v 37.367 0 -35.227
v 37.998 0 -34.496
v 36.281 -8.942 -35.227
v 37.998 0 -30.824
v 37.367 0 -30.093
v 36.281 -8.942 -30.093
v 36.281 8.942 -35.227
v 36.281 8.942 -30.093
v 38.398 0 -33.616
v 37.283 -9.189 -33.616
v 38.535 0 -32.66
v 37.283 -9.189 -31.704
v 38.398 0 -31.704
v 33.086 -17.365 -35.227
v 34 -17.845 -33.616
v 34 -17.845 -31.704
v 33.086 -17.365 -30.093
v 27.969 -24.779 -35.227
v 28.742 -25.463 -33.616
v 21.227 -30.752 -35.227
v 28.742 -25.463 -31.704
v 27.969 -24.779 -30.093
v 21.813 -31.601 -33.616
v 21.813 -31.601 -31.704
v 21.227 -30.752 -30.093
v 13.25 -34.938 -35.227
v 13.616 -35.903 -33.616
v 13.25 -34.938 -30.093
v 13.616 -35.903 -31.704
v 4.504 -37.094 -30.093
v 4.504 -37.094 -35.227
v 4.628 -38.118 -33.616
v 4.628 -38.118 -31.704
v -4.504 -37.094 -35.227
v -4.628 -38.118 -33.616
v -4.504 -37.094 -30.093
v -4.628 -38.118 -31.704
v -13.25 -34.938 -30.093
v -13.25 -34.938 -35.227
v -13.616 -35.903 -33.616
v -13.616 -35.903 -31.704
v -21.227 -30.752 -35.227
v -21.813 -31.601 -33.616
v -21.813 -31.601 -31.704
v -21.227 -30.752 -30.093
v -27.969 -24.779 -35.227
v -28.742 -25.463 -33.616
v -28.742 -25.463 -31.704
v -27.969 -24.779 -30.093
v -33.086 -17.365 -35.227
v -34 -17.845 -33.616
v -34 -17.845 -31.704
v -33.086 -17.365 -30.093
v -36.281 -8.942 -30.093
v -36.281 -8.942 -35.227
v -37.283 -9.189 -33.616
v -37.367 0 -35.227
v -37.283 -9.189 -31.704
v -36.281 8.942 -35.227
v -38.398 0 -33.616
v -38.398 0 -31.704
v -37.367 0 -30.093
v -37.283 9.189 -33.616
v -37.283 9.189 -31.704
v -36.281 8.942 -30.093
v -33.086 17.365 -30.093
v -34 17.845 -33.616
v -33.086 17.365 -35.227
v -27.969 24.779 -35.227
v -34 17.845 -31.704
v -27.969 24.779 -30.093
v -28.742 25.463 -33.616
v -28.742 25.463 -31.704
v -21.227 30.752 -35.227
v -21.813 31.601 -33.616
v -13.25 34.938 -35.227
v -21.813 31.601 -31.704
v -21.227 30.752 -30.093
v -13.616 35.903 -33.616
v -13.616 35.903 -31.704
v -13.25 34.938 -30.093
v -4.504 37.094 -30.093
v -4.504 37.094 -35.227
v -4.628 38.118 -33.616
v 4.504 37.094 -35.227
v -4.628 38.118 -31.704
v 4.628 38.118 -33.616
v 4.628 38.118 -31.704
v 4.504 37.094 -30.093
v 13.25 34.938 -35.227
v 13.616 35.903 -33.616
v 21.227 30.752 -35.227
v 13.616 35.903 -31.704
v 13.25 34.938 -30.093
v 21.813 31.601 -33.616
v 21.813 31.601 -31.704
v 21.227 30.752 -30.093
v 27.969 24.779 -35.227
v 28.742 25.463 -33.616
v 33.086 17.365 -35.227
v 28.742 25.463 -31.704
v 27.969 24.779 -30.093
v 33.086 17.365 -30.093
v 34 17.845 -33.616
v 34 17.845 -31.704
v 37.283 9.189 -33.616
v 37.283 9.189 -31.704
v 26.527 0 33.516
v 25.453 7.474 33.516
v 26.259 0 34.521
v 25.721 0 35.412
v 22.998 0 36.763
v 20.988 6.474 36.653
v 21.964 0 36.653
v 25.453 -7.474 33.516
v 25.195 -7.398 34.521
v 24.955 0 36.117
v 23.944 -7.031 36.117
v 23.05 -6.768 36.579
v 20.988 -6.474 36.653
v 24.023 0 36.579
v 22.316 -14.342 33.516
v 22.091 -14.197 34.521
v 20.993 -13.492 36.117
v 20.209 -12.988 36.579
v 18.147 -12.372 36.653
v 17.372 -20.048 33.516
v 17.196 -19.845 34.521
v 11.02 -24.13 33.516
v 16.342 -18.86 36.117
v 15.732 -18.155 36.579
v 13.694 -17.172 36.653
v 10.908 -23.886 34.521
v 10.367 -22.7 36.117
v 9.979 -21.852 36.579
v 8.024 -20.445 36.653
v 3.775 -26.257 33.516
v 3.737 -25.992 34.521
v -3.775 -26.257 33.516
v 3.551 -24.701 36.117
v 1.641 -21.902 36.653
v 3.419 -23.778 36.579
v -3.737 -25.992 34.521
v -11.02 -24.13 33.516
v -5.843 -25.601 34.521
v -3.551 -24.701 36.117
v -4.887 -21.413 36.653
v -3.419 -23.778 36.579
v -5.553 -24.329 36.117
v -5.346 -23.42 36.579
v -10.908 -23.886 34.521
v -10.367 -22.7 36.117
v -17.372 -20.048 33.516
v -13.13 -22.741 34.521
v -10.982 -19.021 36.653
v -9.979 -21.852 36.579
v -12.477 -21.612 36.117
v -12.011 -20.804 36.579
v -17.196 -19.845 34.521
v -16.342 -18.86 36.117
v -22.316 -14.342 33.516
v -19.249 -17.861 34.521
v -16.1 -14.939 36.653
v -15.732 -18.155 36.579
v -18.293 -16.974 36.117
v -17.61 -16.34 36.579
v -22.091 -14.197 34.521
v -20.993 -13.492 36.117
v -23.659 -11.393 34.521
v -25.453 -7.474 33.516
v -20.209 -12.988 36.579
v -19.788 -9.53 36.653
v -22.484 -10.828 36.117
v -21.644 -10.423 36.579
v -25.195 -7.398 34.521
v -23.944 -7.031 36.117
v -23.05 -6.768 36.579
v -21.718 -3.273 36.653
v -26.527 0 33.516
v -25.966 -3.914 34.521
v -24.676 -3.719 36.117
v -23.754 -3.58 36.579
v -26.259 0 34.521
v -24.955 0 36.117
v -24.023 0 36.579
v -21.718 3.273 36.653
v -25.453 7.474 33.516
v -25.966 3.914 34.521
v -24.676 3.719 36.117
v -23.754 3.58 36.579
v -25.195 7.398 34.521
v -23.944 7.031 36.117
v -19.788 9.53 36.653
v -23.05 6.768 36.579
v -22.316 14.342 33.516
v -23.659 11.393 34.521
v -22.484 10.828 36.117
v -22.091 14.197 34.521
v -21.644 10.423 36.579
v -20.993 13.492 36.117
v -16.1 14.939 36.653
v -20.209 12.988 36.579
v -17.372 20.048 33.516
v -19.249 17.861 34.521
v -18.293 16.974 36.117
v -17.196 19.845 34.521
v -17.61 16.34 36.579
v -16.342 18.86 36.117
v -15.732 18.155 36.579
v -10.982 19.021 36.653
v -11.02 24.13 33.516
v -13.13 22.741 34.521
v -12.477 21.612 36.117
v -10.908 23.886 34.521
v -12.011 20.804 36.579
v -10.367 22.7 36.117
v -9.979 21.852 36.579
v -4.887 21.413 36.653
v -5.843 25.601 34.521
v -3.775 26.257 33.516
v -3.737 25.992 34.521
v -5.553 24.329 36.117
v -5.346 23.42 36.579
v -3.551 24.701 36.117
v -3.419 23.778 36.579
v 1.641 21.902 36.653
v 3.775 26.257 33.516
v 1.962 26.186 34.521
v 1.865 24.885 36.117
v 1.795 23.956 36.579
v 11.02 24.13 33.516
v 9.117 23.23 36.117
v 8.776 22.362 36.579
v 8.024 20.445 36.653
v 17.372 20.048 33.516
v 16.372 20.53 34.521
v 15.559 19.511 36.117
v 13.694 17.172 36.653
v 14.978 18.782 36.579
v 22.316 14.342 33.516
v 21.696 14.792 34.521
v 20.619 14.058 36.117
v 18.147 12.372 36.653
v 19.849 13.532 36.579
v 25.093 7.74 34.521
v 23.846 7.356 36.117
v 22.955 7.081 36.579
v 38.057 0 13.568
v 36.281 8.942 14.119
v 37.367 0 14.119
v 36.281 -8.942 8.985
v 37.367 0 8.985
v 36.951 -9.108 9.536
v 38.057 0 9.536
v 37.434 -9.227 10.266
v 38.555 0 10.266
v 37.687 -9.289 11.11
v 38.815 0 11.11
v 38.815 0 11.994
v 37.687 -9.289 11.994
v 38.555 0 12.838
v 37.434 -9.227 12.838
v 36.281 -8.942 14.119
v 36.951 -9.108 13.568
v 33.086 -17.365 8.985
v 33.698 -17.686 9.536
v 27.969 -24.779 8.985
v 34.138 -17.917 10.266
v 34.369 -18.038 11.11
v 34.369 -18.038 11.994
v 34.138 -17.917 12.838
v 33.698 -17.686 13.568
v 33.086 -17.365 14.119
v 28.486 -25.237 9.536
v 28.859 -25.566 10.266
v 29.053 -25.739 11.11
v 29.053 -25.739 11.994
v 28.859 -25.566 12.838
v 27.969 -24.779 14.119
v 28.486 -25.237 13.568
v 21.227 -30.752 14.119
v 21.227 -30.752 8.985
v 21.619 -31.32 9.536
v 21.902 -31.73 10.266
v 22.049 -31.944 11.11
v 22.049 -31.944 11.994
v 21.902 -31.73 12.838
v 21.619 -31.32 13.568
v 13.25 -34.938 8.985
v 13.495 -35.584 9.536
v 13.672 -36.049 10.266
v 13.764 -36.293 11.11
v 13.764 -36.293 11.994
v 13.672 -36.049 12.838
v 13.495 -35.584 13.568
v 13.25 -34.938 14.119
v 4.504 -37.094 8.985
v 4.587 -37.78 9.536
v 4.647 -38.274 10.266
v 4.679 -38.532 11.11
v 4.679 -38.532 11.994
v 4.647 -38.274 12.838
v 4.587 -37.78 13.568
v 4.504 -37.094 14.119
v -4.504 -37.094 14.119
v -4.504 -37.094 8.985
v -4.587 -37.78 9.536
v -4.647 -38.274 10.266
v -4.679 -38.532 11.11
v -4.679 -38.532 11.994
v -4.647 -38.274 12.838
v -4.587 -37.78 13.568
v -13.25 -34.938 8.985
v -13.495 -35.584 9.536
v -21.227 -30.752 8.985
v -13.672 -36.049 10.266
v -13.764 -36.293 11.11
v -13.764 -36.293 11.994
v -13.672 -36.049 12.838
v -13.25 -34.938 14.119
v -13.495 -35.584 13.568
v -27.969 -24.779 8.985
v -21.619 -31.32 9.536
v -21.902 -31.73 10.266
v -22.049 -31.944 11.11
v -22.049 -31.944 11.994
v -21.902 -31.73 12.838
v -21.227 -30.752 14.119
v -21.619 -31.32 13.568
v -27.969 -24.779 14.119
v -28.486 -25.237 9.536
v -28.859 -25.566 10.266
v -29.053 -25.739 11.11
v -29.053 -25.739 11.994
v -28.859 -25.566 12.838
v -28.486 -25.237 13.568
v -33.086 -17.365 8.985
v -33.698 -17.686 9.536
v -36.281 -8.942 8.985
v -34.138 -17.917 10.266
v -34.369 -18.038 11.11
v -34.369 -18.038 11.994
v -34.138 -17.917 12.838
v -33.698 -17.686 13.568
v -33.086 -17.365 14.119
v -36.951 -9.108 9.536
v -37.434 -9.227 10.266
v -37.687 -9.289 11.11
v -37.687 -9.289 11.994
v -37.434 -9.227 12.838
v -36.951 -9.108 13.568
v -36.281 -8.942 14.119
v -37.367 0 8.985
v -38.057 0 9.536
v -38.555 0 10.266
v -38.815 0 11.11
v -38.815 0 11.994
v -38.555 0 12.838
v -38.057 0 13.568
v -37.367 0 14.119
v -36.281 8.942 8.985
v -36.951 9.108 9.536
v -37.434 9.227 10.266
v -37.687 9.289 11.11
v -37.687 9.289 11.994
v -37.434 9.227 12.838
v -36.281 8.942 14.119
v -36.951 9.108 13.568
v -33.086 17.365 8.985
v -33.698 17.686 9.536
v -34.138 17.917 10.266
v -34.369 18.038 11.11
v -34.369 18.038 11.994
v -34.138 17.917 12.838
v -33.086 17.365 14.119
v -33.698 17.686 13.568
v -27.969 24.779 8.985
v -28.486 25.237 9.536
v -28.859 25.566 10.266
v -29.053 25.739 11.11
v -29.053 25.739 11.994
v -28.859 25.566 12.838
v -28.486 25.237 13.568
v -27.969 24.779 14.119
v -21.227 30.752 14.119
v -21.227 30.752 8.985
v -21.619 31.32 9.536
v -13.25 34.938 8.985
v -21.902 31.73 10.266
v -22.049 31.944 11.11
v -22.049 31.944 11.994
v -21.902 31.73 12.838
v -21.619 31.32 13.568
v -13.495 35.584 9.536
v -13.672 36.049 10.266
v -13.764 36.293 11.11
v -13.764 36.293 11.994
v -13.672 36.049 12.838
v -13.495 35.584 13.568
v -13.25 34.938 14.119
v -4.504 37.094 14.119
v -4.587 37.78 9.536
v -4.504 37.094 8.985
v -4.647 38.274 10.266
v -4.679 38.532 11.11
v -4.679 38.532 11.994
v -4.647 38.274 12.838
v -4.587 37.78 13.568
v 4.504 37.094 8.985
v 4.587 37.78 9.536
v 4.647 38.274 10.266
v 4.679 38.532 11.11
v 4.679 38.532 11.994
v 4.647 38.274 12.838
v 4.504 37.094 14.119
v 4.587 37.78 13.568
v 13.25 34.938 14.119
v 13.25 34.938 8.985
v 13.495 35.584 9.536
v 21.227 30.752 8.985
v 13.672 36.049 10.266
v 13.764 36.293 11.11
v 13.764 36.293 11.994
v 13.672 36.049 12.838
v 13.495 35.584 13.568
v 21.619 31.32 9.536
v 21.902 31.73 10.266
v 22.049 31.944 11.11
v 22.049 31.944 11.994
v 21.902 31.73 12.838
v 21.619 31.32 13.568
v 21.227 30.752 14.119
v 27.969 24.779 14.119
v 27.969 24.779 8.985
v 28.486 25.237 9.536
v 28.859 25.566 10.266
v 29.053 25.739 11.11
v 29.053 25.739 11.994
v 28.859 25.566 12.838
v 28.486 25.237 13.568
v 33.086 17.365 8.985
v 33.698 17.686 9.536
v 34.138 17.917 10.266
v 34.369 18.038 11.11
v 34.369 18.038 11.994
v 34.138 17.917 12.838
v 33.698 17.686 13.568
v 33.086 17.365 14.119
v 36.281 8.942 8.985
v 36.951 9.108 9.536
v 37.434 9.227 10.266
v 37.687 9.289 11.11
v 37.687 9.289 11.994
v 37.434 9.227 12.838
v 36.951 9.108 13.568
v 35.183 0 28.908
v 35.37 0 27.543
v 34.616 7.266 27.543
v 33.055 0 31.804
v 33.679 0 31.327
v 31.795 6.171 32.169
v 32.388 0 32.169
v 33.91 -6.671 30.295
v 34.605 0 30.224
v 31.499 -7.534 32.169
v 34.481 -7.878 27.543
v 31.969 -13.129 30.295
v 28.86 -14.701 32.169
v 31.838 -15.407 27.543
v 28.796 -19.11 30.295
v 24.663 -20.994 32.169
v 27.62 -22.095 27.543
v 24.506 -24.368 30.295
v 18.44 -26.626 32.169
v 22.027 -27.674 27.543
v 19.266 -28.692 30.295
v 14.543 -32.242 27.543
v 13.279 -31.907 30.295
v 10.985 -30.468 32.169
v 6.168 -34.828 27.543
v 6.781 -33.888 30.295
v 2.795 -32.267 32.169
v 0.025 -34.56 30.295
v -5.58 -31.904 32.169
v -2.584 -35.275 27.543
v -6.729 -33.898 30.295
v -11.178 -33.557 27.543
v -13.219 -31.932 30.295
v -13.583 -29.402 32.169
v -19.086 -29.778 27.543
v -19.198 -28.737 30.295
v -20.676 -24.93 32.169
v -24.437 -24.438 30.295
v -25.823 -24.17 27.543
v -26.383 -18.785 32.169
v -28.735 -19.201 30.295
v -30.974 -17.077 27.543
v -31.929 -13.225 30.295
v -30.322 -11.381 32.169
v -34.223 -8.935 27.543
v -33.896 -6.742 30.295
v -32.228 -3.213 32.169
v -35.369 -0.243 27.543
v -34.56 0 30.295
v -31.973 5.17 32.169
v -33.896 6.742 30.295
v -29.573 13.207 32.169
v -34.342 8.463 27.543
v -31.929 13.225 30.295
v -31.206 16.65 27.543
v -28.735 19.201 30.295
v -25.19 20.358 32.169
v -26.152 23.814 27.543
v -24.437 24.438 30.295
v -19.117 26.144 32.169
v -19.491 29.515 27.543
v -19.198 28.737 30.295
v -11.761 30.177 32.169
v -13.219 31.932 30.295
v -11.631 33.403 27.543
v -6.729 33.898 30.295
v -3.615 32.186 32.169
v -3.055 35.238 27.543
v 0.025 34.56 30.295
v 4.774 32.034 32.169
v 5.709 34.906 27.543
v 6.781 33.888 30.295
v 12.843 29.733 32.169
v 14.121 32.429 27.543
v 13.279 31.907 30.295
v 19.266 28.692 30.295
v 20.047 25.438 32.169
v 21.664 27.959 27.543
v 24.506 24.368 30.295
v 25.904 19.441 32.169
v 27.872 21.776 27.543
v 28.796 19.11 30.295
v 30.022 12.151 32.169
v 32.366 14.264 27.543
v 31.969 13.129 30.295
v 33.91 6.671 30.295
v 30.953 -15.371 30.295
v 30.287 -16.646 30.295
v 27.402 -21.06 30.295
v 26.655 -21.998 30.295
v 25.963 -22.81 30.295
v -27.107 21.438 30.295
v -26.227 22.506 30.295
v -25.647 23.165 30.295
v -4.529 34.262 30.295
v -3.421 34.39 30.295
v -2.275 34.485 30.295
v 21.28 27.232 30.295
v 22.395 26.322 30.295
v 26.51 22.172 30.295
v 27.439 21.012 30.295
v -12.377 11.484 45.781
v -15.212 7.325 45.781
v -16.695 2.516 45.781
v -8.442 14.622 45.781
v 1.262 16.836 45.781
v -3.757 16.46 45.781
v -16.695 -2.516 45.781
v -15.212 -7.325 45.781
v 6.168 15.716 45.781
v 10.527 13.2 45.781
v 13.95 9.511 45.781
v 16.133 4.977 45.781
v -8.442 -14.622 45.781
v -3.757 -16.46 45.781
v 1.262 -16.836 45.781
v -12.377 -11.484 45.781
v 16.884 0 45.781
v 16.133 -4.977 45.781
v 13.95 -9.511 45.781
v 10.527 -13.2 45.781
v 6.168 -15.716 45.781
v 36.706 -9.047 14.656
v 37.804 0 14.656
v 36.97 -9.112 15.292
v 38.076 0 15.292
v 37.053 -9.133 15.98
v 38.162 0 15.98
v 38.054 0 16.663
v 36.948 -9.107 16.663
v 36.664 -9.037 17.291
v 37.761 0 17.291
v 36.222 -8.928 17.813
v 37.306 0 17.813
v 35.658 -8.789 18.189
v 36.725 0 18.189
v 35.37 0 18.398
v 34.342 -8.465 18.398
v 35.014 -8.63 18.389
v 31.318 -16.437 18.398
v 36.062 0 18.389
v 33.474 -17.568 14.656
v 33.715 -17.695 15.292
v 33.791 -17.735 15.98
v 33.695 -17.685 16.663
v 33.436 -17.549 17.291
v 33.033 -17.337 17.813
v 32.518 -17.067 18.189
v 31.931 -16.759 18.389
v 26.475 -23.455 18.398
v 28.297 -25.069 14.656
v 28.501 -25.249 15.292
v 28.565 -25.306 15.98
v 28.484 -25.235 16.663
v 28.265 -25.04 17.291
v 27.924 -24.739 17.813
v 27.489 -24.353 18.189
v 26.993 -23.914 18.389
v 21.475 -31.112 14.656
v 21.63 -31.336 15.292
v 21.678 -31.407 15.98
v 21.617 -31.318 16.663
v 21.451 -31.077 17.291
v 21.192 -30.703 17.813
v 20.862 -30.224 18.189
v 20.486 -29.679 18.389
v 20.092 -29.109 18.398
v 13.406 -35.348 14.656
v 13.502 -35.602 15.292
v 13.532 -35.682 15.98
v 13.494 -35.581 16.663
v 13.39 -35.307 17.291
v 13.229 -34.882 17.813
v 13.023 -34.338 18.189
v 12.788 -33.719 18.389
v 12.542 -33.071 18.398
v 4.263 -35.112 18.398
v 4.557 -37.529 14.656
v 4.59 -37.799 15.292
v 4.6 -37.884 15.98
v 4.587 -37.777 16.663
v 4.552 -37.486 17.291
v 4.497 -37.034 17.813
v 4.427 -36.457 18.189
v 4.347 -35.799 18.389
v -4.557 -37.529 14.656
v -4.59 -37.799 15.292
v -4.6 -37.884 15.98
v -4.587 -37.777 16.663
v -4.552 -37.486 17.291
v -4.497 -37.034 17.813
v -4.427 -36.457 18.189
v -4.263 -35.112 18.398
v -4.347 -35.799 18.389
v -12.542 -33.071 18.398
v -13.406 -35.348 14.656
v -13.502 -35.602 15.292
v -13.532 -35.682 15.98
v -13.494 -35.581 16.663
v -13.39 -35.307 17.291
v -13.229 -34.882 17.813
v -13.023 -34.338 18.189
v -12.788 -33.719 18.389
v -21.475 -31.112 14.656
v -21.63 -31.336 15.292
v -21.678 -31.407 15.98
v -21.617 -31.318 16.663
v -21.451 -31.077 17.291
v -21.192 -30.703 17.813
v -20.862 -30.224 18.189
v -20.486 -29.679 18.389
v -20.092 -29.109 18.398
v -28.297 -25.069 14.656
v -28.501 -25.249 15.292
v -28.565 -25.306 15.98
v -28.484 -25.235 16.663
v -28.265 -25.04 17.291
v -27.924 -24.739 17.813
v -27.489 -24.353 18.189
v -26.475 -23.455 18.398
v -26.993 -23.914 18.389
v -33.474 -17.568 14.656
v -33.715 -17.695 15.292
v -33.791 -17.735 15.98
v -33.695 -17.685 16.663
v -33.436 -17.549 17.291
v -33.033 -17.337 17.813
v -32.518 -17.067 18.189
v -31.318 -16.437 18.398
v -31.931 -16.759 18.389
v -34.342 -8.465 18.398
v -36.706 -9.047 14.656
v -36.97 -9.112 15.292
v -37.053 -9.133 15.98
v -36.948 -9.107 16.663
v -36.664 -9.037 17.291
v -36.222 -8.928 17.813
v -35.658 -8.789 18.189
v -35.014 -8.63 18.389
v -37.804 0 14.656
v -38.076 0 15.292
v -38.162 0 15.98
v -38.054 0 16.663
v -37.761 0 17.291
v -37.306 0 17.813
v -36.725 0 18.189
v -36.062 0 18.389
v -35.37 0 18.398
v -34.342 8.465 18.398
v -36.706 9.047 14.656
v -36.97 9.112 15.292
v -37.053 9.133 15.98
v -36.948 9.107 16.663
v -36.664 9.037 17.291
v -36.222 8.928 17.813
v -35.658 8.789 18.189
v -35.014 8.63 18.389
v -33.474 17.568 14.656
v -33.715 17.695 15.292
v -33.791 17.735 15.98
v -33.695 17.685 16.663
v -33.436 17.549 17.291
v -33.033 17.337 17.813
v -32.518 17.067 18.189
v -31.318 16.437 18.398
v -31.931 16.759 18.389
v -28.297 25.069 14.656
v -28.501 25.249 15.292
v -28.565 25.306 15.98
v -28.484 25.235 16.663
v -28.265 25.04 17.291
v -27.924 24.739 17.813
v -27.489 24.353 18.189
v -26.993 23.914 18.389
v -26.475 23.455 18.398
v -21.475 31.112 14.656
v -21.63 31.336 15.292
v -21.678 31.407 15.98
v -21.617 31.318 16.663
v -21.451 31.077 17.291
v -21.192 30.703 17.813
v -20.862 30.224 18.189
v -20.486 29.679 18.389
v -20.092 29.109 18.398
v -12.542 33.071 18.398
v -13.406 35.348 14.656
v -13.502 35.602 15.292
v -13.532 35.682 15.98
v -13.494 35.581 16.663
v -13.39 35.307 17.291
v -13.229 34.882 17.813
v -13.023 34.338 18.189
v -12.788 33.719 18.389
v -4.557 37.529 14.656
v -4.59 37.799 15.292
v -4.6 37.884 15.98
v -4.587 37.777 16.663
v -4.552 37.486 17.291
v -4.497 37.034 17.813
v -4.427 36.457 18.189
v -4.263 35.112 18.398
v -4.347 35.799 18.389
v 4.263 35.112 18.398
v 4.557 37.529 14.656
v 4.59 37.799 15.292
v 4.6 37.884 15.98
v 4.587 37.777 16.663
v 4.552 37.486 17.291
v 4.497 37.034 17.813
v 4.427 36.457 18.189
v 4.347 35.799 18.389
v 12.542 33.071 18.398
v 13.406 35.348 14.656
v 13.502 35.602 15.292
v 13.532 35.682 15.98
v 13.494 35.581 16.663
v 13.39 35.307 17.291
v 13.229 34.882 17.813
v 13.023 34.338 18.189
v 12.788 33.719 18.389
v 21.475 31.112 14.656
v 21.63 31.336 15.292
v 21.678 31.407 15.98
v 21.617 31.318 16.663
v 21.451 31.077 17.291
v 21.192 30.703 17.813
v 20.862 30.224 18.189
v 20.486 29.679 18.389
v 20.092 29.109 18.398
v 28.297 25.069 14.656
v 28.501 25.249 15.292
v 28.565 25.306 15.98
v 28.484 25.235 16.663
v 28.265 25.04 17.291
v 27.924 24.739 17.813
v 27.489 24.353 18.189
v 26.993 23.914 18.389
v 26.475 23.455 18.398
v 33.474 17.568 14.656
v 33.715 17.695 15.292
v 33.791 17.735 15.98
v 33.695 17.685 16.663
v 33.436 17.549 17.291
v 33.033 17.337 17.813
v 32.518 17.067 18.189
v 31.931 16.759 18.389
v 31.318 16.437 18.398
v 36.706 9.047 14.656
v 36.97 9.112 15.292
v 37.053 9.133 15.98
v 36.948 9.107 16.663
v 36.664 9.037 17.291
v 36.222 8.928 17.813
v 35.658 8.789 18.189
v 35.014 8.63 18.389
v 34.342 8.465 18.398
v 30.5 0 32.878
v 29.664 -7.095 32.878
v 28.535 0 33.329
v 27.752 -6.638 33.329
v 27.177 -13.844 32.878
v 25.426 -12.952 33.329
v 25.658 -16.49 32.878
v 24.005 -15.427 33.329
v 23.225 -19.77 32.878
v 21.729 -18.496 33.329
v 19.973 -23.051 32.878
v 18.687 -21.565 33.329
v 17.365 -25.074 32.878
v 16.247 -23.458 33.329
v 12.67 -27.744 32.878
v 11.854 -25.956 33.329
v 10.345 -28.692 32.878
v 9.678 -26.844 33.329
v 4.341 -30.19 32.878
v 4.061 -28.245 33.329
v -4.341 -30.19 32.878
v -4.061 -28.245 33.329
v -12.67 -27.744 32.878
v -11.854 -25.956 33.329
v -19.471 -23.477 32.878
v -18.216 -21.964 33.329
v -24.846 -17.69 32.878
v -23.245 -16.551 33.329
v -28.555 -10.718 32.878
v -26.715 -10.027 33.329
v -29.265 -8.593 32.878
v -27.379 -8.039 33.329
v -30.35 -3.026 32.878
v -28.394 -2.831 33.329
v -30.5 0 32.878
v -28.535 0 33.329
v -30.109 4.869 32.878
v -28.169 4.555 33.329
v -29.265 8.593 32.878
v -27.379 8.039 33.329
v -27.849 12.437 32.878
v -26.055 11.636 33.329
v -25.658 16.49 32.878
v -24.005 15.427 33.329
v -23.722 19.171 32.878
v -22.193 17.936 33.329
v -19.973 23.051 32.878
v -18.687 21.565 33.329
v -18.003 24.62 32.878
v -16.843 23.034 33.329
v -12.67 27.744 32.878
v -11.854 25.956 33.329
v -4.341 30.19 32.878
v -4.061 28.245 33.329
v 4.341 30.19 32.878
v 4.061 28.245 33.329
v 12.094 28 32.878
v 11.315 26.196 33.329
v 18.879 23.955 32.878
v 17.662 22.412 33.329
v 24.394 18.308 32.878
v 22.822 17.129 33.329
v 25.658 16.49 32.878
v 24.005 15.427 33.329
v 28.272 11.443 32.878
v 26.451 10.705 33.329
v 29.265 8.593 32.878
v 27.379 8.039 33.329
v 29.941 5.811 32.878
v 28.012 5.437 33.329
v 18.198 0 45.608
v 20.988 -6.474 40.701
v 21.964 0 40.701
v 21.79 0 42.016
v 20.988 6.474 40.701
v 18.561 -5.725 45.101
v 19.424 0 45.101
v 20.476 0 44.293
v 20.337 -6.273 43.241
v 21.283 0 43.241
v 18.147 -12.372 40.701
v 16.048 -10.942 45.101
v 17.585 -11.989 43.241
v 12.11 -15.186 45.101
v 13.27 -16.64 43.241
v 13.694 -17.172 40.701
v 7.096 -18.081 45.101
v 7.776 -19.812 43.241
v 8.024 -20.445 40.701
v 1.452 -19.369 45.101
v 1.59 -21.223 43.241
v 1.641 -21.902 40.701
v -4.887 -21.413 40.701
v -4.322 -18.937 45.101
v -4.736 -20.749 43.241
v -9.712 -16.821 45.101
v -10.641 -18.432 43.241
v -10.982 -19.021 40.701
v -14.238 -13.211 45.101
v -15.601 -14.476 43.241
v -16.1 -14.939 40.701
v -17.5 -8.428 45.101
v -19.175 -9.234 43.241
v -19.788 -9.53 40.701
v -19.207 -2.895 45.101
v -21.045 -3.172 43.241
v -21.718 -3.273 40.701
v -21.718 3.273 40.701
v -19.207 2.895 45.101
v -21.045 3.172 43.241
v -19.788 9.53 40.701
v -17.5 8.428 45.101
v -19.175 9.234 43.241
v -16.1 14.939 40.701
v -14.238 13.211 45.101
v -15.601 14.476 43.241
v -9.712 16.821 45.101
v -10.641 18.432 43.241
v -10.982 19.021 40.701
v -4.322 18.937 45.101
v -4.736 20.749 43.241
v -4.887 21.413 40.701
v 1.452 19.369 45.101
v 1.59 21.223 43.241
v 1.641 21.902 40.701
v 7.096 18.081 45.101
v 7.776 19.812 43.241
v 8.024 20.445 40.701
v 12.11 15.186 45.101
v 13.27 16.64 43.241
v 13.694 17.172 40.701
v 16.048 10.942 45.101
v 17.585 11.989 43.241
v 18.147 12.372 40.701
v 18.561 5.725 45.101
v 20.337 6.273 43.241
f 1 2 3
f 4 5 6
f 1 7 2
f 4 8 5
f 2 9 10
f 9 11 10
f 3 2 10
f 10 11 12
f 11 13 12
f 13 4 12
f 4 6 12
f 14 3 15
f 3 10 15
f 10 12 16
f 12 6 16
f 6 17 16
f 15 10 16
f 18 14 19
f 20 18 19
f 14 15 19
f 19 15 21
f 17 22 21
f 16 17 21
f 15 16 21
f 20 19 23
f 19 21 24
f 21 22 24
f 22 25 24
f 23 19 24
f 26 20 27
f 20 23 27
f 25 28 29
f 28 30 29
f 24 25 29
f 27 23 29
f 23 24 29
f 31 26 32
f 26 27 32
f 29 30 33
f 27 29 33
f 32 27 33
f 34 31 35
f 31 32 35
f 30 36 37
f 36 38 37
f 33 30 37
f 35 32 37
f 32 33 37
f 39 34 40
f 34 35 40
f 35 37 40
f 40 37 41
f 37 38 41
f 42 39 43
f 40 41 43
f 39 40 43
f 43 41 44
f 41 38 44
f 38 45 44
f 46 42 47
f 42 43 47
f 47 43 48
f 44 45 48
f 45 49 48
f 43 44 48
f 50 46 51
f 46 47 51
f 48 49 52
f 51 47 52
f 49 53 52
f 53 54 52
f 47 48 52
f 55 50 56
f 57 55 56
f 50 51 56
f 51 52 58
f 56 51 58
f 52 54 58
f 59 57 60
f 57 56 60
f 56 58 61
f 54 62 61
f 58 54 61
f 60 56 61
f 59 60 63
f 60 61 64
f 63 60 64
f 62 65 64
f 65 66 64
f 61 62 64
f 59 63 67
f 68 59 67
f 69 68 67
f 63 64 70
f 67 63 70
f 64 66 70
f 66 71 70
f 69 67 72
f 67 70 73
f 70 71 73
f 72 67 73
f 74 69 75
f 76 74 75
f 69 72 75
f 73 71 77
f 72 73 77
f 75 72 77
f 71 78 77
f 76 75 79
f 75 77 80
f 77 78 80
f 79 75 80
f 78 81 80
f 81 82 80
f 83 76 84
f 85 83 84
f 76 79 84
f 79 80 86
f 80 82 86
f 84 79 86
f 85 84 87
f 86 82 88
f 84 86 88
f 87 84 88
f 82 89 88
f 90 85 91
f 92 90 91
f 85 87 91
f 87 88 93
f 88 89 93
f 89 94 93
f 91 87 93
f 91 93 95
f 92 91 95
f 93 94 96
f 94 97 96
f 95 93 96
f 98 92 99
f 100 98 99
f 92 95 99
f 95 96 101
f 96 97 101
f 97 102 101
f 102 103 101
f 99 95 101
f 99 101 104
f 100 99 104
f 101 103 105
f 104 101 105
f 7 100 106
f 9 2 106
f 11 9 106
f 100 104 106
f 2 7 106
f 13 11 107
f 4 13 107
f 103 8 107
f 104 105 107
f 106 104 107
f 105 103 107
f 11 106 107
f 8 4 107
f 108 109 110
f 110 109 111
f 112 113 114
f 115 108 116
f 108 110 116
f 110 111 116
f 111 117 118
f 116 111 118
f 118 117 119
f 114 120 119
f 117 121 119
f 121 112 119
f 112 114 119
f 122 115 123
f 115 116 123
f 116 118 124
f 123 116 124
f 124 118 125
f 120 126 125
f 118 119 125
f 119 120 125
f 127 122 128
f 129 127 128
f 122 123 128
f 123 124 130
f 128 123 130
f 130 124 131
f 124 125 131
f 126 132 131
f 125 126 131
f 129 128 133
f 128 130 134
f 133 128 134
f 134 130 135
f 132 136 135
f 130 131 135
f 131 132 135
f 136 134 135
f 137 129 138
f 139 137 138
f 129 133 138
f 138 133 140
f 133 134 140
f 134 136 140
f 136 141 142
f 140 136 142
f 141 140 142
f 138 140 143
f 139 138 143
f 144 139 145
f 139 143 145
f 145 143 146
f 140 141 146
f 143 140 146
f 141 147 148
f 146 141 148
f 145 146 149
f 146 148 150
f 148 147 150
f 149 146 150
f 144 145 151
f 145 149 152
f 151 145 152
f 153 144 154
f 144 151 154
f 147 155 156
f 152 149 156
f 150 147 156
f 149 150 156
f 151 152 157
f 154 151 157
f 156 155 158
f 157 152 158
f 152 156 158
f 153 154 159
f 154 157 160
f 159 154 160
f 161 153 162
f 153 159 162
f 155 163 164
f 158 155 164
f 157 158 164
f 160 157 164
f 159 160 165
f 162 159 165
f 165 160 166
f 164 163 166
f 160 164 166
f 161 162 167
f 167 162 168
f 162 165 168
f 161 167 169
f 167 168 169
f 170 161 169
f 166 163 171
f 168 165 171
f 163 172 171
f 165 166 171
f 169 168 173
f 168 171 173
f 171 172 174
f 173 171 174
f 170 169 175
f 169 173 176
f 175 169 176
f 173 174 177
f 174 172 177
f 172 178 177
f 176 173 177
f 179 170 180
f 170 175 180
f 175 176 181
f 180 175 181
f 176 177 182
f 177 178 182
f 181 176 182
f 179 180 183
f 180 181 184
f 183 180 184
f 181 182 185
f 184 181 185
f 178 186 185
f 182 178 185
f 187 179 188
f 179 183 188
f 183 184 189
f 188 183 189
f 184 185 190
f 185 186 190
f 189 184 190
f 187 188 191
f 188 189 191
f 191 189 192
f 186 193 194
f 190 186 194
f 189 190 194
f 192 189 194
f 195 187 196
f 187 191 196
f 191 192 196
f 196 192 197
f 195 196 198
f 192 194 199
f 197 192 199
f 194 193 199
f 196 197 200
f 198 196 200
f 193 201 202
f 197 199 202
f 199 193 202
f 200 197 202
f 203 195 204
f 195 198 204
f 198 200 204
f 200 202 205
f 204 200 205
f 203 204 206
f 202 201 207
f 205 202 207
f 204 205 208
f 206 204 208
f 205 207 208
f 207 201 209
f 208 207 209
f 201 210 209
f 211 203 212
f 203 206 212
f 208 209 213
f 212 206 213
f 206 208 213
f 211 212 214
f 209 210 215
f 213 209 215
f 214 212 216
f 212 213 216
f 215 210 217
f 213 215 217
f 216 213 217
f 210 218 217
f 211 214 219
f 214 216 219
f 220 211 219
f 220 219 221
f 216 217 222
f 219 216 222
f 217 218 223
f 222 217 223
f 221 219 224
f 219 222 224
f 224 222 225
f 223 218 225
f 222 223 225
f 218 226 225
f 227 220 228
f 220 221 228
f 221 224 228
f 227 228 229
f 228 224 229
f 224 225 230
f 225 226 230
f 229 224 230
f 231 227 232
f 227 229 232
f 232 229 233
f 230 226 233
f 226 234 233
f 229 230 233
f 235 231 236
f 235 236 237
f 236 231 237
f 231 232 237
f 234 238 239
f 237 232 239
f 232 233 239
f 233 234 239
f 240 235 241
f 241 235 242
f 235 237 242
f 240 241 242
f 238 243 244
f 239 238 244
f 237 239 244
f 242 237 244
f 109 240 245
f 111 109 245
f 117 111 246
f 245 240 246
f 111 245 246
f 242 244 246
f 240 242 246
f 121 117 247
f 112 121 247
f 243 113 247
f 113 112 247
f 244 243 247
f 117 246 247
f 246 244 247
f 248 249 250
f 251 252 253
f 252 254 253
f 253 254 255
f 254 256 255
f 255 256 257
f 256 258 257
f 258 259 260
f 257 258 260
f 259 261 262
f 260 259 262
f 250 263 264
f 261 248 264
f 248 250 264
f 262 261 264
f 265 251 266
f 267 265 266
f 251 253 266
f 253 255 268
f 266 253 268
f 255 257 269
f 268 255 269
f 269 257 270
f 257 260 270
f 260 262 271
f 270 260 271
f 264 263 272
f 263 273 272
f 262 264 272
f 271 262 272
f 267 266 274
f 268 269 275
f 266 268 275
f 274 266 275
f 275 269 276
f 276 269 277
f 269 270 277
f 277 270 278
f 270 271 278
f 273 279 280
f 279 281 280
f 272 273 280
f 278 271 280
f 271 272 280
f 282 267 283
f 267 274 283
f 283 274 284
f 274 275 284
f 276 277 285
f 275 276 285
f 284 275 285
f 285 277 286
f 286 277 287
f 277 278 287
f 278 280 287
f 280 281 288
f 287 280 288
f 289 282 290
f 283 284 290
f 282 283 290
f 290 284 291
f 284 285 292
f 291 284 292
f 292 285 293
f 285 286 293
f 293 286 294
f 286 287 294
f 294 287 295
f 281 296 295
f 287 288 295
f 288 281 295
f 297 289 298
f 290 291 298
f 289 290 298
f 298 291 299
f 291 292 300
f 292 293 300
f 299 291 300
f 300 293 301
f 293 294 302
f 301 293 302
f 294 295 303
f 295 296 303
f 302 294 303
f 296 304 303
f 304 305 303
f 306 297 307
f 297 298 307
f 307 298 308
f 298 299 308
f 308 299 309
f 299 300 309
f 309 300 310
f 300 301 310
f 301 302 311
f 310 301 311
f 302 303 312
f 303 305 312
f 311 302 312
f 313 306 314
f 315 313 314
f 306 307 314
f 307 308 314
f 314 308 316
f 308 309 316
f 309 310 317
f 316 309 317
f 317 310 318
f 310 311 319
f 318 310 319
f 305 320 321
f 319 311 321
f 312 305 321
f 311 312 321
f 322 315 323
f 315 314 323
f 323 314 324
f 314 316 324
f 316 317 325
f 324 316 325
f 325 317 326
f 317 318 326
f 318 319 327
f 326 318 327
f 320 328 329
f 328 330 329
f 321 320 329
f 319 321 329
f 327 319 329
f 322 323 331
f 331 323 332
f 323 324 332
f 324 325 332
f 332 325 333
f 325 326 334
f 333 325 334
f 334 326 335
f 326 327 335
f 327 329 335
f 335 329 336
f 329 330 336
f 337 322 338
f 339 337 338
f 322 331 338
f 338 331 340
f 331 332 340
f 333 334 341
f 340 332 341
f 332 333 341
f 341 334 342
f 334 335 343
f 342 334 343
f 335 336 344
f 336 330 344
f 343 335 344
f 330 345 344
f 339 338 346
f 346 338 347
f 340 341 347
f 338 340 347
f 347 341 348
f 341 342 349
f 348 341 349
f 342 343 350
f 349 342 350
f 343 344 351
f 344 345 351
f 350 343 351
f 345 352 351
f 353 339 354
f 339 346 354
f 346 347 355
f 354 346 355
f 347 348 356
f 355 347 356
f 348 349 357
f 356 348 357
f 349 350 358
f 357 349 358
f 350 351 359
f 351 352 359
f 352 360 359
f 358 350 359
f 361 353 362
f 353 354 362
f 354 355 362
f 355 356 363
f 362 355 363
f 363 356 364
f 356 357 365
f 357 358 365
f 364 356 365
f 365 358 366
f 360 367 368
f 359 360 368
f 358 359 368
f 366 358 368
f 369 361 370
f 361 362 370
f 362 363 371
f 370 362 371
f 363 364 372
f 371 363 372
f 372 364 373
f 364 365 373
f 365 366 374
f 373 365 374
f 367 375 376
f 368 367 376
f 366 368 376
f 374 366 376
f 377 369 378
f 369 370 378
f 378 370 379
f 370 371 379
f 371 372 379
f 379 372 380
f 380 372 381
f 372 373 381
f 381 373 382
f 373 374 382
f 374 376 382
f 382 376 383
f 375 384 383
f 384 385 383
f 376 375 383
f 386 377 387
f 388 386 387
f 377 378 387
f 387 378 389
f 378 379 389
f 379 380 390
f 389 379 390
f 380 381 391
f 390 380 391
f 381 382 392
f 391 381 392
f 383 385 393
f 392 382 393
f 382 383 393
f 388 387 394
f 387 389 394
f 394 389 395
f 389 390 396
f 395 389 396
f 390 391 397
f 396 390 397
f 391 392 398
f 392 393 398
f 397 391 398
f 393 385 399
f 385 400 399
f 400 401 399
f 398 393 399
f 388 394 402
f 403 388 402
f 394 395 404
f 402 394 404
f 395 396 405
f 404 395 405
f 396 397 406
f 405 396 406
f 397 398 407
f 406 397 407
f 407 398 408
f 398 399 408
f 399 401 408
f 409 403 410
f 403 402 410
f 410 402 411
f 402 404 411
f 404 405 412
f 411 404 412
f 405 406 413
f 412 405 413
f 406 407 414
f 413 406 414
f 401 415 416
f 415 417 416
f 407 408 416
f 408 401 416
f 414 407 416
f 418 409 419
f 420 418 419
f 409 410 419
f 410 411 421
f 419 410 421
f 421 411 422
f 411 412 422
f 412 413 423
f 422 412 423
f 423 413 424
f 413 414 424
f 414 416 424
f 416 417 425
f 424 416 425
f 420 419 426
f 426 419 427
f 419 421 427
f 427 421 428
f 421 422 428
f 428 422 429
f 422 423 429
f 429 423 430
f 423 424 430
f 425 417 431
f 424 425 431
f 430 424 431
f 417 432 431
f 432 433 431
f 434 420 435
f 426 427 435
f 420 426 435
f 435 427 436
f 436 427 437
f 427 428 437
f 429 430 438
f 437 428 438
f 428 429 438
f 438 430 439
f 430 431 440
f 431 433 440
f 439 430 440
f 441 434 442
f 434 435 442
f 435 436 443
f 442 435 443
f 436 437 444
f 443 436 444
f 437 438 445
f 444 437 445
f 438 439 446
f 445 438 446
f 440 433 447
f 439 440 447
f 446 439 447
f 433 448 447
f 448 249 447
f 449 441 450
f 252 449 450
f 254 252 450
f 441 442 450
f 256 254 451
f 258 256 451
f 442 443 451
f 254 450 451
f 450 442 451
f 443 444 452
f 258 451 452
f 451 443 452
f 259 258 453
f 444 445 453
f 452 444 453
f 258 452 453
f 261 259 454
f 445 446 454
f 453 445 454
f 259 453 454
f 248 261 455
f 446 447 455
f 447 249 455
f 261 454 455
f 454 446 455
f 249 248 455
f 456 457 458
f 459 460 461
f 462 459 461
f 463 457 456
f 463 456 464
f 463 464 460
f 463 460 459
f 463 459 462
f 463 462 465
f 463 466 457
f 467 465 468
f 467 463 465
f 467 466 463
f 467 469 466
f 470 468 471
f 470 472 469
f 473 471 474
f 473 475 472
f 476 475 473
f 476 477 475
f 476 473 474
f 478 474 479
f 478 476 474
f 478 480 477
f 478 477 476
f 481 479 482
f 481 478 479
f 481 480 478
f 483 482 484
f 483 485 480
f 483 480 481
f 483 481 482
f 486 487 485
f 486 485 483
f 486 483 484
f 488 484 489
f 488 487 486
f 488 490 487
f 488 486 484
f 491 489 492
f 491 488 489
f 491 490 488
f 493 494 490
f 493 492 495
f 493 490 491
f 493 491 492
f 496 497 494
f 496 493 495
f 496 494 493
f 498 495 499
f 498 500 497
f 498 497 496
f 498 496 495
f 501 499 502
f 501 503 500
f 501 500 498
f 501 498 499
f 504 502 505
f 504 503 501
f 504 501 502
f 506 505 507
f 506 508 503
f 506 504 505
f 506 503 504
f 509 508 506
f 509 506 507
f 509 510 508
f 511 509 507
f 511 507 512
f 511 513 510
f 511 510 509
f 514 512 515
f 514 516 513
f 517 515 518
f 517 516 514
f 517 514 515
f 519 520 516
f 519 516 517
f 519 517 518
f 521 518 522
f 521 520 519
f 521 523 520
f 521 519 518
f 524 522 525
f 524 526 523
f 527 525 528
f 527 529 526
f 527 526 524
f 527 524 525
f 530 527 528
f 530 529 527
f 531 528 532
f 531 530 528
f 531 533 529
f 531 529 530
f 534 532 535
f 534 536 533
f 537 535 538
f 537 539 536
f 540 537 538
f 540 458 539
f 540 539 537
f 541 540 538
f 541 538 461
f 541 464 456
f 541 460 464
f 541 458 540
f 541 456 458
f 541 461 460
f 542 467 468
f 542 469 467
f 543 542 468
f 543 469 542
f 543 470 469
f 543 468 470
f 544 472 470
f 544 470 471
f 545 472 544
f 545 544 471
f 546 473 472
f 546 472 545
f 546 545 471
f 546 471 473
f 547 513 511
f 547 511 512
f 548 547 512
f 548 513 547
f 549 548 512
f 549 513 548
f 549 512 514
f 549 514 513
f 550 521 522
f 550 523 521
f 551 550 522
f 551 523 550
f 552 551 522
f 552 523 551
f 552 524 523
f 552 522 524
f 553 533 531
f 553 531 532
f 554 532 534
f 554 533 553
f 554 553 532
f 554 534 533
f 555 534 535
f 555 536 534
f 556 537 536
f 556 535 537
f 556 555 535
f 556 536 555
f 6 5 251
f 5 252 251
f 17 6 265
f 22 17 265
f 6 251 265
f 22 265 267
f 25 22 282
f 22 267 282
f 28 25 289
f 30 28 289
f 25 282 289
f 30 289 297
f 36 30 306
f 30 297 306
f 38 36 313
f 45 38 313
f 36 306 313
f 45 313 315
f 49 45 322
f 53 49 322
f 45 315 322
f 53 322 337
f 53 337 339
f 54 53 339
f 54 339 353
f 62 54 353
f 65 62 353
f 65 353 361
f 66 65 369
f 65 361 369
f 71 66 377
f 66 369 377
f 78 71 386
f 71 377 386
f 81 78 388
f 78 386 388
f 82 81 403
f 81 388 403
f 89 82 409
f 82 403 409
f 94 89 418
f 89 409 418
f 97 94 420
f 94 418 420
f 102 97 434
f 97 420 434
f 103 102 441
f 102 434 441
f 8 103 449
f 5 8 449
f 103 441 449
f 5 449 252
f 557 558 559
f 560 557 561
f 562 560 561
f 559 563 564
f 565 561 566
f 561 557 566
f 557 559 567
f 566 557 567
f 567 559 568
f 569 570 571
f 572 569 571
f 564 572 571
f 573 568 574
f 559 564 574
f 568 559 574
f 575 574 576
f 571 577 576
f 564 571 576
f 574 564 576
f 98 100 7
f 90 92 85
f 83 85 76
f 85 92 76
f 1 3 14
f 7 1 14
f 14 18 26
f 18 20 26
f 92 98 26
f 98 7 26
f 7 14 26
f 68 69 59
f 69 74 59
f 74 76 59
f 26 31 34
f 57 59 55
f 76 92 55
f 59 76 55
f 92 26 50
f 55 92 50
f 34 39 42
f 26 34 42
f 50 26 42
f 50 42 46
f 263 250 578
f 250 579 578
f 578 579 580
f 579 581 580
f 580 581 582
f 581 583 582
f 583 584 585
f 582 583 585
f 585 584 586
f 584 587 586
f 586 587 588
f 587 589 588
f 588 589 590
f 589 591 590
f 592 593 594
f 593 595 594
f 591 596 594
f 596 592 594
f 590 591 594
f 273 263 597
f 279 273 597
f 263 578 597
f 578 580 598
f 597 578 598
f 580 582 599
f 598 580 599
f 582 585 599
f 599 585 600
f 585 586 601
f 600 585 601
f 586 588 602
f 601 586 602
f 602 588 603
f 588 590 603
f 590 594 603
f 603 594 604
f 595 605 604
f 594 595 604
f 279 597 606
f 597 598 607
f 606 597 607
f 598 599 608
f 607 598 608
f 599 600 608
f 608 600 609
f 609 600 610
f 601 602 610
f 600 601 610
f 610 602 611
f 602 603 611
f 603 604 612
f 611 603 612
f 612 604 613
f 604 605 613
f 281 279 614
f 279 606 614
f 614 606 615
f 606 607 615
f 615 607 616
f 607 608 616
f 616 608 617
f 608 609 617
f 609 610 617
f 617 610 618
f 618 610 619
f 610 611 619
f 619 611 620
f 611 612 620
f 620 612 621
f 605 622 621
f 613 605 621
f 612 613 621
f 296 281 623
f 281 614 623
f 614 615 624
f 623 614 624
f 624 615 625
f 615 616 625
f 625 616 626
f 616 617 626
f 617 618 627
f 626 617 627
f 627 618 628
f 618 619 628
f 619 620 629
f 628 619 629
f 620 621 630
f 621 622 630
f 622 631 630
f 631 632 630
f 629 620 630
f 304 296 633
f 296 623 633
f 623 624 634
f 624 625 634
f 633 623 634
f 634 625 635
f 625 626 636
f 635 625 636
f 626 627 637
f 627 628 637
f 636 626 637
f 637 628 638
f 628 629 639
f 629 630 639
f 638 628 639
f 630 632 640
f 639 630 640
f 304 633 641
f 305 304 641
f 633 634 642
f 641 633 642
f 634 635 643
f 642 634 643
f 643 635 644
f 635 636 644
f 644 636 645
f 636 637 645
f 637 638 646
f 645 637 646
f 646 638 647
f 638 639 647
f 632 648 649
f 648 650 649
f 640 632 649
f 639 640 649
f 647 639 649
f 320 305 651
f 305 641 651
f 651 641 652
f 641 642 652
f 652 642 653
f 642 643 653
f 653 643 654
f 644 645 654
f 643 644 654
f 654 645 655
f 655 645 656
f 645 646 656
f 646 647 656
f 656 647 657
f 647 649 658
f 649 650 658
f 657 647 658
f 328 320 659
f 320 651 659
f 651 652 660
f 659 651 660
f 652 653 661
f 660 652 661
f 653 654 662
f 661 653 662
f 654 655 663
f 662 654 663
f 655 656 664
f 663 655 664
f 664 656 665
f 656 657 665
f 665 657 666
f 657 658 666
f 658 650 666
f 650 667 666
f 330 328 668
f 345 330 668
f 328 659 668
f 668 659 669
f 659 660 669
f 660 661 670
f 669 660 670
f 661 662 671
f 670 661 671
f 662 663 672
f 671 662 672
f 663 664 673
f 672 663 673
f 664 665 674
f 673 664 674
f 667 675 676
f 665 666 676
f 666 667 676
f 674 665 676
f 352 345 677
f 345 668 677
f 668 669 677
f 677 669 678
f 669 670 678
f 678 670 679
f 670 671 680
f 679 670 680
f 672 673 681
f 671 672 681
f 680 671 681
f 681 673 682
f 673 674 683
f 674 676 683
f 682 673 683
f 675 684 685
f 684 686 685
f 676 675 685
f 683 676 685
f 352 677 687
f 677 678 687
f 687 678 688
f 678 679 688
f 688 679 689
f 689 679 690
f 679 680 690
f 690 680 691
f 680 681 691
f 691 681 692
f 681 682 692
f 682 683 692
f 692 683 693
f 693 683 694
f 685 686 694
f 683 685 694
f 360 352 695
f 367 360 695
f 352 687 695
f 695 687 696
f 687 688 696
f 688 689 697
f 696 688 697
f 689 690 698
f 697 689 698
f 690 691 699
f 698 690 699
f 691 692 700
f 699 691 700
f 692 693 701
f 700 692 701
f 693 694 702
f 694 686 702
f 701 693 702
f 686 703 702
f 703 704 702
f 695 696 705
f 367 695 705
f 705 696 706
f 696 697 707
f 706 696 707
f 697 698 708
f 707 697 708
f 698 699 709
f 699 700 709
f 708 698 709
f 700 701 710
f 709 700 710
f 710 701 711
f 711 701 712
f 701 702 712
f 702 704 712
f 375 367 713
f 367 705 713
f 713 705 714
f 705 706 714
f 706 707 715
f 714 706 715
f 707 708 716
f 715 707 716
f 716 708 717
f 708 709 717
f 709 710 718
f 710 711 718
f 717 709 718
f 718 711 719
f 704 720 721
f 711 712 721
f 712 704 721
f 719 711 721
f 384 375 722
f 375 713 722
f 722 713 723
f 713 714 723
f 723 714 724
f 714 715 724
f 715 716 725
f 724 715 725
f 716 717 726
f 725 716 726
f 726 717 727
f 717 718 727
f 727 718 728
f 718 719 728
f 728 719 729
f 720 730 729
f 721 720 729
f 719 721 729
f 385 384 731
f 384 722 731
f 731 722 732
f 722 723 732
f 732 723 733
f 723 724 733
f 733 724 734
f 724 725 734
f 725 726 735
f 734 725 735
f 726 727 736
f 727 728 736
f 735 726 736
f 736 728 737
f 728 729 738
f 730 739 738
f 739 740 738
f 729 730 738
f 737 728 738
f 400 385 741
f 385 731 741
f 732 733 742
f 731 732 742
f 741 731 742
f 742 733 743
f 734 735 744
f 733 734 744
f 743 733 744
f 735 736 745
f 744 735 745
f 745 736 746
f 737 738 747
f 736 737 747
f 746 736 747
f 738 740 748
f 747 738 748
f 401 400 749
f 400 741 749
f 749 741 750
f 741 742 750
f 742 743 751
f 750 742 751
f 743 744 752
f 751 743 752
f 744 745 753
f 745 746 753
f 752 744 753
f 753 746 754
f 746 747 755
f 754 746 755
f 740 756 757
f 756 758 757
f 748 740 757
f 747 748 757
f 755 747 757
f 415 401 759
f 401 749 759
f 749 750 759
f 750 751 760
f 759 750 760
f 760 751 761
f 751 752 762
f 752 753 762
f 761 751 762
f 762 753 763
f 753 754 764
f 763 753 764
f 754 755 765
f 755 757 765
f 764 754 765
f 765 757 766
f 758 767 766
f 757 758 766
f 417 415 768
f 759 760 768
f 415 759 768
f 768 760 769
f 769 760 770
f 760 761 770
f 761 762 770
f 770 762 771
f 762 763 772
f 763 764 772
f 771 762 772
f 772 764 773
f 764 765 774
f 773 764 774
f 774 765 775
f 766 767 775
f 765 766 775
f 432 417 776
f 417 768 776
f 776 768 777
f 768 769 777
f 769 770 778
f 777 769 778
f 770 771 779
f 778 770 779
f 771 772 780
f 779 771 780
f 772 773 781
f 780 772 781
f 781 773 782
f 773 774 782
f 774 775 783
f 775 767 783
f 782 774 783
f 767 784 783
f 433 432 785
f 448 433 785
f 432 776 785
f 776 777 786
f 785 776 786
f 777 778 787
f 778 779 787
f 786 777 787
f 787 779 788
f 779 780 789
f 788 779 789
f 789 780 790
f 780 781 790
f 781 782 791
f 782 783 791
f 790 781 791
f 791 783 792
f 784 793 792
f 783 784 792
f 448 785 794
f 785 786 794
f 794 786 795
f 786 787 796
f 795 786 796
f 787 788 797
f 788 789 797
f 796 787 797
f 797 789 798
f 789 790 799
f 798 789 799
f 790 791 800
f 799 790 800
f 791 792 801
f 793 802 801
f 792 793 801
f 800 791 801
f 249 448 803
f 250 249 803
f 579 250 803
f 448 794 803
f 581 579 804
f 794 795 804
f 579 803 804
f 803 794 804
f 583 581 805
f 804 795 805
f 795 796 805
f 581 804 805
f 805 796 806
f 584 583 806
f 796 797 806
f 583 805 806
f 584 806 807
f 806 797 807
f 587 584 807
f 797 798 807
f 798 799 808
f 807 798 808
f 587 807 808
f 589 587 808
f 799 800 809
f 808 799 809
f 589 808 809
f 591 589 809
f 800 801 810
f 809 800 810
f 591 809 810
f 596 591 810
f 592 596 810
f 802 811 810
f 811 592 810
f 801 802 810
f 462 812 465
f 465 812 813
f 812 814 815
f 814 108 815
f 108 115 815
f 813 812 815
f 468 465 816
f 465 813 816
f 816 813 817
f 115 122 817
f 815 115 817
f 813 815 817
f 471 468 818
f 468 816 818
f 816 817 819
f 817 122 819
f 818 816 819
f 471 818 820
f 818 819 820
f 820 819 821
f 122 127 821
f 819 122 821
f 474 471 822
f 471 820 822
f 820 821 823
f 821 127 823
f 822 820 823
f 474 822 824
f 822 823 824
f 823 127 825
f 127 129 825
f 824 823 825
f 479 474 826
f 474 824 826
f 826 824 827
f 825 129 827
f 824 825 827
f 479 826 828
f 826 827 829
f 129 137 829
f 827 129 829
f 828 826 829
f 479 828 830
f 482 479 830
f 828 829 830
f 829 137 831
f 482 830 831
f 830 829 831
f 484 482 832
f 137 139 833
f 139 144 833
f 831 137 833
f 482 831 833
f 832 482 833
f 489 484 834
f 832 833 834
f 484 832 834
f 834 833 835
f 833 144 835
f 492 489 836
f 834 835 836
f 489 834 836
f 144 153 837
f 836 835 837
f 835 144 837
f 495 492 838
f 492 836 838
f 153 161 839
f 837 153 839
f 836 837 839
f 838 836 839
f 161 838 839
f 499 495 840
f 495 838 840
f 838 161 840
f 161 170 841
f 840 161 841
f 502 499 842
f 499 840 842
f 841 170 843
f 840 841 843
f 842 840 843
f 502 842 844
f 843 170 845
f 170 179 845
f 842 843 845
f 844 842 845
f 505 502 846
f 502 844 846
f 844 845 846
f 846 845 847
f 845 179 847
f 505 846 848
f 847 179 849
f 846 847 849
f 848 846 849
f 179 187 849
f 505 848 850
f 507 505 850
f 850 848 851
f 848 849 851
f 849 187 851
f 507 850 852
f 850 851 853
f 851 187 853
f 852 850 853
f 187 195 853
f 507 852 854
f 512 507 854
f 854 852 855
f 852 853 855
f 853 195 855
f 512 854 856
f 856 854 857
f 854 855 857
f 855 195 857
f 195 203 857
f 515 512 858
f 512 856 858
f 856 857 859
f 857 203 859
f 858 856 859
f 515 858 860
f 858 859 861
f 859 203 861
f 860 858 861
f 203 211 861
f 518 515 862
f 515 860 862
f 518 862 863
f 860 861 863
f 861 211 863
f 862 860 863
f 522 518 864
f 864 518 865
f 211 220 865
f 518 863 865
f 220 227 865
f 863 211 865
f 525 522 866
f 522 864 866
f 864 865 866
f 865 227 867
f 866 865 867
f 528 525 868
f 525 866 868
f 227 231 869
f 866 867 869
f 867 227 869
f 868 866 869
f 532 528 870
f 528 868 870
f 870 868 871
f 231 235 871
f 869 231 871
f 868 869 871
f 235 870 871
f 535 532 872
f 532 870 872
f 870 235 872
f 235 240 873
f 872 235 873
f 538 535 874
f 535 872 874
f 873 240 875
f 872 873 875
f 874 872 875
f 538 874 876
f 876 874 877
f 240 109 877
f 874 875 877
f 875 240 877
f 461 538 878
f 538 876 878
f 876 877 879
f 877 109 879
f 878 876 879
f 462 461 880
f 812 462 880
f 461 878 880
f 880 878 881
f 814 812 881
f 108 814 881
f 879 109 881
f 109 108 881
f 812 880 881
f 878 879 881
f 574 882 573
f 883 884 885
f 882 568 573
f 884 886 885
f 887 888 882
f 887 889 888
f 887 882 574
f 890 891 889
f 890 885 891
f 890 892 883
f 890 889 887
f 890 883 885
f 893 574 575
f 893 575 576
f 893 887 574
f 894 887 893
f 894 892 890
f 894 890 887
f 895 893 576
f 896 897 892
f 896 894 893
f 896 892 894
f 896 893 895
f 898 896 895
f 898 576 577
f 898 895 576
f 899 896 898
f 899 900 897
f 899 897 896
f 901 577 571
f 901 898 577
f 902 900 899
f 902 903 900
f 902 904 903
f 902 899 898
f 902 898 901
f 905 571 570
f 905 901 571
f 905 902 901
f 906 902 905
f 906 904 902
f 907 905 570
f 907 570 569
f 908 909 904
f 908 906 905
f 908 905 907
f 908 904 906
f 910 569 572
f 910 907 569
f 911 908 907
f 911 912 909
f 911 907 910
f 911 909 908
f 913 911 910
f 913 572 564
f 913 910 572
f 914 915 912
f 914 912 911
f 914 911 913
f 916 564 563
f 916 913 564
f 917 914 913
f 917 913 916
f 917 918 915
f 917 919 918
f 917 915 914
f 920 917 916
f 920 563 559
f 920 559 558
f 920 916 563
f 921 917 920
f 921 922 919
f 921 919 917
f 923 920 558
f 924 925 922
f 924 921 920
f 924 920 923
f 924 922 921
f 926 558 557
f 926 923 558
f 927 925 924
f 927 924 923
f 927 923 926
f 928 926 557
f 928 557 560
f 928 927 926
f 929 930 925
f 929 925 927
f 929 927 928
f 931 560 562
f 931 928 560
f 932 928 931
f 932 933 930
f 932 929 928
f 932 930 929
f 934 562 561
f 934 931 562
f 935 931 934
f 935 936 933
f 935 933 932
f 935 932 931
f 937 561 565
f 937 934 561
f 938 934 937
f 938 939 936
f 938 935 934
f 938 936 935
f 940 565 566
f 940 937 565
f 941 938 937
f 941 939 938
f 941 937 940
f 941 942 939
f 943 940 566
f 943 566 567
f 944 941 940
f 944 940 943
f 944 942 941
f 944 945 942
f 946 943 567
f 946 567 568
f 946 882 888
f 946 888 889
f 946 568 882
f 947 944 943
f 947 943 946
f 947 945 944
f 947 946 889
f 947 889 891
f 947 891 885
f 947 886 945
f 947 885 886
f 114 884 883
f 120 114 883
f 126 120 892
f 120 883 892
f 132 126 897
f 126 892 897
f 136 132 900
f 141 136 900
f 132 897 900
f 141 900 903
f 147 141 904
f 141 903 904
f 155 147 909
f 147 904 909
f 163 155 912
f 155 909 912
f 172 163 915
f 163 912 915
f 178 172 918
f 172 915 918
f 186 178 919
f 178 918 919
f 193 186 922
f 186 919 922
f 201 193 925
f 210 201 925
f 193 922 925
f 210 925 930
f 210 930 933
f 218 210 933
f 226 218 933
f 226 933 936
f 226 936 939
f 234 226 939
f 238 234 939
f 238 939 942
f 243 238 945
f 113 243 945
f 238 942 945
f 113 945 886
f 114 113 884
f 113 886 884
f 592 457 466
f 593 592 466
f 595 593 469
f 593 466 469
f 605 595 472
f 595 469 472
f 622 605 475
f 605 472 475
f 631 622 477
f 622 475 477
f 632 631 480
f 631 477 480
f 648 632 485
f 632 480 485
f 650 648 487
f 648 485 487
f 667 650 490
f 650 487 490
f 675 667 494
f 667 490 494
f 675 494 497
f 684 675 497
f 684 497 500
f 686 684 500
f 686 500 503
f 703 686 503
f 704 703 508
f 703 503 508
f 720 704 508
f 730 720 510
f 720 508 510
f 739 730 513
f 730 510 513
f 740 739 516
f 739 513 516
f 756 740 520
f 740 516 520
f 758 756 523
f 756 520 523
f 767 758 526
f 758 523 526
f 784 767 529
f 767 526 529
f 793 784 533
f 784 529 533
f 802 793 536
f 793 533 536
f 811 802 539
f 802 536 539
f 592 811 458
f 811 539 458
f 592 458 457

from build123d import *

# Parameters (mm, degrees)
F2_R = 5.08


with BuildPart() as f1:
    # F0 (on Front) → F1 (revolve)
    with BuildSketch(Plane.XZ):
        with BuildLine():
            Line((21.963529, 45.781121), (0, 45.781121))
            Line((0, 45.781121), (0, -35.227221))
            Line((0, -35.227221), (37.366528, -35.227221))
            ThreePointArc((37.366528, -35.227221), (38.535496, -32.660054), (37.366528, -30.092888))
            Line((37.366528, -30.092888), (37.366528, 8.98508))
            ThreePointArc((37.366528, 8.98508), (38.848131, 11.552246), (37.366528, 14.119413))
            ThreePointArc((37.366528, 14.119413), (37.929775, 16.987459), (35.369843, 18.398022))
            Line((35.369843, 18.398022), (35.369843, 30.378129))
            ThreePointArc((35.369843, 30.378129), (31.19776, 32.6491), (26.527379, 33.515774))
            ThreePointArc((26.527379, 33.515774), (24.954924, 36.116554), (21.963529, 36.653422))
            Line((21.963529, 36.653422), (21.963529, 45.781121))
        make_face()
    revolve(axis=Axis((0, 0, 5.27695), (0, 0, -1)))

    # F2
    f2_edges = [f1.edges().sort_by_distance(p)[0] for p in [
        (-21.963529, 0, 45.781121),
        (-35.369843, 0, 30.378129),
    ]]
    fillet(f2_edges, radius=F2_R)


solid = f1.part
